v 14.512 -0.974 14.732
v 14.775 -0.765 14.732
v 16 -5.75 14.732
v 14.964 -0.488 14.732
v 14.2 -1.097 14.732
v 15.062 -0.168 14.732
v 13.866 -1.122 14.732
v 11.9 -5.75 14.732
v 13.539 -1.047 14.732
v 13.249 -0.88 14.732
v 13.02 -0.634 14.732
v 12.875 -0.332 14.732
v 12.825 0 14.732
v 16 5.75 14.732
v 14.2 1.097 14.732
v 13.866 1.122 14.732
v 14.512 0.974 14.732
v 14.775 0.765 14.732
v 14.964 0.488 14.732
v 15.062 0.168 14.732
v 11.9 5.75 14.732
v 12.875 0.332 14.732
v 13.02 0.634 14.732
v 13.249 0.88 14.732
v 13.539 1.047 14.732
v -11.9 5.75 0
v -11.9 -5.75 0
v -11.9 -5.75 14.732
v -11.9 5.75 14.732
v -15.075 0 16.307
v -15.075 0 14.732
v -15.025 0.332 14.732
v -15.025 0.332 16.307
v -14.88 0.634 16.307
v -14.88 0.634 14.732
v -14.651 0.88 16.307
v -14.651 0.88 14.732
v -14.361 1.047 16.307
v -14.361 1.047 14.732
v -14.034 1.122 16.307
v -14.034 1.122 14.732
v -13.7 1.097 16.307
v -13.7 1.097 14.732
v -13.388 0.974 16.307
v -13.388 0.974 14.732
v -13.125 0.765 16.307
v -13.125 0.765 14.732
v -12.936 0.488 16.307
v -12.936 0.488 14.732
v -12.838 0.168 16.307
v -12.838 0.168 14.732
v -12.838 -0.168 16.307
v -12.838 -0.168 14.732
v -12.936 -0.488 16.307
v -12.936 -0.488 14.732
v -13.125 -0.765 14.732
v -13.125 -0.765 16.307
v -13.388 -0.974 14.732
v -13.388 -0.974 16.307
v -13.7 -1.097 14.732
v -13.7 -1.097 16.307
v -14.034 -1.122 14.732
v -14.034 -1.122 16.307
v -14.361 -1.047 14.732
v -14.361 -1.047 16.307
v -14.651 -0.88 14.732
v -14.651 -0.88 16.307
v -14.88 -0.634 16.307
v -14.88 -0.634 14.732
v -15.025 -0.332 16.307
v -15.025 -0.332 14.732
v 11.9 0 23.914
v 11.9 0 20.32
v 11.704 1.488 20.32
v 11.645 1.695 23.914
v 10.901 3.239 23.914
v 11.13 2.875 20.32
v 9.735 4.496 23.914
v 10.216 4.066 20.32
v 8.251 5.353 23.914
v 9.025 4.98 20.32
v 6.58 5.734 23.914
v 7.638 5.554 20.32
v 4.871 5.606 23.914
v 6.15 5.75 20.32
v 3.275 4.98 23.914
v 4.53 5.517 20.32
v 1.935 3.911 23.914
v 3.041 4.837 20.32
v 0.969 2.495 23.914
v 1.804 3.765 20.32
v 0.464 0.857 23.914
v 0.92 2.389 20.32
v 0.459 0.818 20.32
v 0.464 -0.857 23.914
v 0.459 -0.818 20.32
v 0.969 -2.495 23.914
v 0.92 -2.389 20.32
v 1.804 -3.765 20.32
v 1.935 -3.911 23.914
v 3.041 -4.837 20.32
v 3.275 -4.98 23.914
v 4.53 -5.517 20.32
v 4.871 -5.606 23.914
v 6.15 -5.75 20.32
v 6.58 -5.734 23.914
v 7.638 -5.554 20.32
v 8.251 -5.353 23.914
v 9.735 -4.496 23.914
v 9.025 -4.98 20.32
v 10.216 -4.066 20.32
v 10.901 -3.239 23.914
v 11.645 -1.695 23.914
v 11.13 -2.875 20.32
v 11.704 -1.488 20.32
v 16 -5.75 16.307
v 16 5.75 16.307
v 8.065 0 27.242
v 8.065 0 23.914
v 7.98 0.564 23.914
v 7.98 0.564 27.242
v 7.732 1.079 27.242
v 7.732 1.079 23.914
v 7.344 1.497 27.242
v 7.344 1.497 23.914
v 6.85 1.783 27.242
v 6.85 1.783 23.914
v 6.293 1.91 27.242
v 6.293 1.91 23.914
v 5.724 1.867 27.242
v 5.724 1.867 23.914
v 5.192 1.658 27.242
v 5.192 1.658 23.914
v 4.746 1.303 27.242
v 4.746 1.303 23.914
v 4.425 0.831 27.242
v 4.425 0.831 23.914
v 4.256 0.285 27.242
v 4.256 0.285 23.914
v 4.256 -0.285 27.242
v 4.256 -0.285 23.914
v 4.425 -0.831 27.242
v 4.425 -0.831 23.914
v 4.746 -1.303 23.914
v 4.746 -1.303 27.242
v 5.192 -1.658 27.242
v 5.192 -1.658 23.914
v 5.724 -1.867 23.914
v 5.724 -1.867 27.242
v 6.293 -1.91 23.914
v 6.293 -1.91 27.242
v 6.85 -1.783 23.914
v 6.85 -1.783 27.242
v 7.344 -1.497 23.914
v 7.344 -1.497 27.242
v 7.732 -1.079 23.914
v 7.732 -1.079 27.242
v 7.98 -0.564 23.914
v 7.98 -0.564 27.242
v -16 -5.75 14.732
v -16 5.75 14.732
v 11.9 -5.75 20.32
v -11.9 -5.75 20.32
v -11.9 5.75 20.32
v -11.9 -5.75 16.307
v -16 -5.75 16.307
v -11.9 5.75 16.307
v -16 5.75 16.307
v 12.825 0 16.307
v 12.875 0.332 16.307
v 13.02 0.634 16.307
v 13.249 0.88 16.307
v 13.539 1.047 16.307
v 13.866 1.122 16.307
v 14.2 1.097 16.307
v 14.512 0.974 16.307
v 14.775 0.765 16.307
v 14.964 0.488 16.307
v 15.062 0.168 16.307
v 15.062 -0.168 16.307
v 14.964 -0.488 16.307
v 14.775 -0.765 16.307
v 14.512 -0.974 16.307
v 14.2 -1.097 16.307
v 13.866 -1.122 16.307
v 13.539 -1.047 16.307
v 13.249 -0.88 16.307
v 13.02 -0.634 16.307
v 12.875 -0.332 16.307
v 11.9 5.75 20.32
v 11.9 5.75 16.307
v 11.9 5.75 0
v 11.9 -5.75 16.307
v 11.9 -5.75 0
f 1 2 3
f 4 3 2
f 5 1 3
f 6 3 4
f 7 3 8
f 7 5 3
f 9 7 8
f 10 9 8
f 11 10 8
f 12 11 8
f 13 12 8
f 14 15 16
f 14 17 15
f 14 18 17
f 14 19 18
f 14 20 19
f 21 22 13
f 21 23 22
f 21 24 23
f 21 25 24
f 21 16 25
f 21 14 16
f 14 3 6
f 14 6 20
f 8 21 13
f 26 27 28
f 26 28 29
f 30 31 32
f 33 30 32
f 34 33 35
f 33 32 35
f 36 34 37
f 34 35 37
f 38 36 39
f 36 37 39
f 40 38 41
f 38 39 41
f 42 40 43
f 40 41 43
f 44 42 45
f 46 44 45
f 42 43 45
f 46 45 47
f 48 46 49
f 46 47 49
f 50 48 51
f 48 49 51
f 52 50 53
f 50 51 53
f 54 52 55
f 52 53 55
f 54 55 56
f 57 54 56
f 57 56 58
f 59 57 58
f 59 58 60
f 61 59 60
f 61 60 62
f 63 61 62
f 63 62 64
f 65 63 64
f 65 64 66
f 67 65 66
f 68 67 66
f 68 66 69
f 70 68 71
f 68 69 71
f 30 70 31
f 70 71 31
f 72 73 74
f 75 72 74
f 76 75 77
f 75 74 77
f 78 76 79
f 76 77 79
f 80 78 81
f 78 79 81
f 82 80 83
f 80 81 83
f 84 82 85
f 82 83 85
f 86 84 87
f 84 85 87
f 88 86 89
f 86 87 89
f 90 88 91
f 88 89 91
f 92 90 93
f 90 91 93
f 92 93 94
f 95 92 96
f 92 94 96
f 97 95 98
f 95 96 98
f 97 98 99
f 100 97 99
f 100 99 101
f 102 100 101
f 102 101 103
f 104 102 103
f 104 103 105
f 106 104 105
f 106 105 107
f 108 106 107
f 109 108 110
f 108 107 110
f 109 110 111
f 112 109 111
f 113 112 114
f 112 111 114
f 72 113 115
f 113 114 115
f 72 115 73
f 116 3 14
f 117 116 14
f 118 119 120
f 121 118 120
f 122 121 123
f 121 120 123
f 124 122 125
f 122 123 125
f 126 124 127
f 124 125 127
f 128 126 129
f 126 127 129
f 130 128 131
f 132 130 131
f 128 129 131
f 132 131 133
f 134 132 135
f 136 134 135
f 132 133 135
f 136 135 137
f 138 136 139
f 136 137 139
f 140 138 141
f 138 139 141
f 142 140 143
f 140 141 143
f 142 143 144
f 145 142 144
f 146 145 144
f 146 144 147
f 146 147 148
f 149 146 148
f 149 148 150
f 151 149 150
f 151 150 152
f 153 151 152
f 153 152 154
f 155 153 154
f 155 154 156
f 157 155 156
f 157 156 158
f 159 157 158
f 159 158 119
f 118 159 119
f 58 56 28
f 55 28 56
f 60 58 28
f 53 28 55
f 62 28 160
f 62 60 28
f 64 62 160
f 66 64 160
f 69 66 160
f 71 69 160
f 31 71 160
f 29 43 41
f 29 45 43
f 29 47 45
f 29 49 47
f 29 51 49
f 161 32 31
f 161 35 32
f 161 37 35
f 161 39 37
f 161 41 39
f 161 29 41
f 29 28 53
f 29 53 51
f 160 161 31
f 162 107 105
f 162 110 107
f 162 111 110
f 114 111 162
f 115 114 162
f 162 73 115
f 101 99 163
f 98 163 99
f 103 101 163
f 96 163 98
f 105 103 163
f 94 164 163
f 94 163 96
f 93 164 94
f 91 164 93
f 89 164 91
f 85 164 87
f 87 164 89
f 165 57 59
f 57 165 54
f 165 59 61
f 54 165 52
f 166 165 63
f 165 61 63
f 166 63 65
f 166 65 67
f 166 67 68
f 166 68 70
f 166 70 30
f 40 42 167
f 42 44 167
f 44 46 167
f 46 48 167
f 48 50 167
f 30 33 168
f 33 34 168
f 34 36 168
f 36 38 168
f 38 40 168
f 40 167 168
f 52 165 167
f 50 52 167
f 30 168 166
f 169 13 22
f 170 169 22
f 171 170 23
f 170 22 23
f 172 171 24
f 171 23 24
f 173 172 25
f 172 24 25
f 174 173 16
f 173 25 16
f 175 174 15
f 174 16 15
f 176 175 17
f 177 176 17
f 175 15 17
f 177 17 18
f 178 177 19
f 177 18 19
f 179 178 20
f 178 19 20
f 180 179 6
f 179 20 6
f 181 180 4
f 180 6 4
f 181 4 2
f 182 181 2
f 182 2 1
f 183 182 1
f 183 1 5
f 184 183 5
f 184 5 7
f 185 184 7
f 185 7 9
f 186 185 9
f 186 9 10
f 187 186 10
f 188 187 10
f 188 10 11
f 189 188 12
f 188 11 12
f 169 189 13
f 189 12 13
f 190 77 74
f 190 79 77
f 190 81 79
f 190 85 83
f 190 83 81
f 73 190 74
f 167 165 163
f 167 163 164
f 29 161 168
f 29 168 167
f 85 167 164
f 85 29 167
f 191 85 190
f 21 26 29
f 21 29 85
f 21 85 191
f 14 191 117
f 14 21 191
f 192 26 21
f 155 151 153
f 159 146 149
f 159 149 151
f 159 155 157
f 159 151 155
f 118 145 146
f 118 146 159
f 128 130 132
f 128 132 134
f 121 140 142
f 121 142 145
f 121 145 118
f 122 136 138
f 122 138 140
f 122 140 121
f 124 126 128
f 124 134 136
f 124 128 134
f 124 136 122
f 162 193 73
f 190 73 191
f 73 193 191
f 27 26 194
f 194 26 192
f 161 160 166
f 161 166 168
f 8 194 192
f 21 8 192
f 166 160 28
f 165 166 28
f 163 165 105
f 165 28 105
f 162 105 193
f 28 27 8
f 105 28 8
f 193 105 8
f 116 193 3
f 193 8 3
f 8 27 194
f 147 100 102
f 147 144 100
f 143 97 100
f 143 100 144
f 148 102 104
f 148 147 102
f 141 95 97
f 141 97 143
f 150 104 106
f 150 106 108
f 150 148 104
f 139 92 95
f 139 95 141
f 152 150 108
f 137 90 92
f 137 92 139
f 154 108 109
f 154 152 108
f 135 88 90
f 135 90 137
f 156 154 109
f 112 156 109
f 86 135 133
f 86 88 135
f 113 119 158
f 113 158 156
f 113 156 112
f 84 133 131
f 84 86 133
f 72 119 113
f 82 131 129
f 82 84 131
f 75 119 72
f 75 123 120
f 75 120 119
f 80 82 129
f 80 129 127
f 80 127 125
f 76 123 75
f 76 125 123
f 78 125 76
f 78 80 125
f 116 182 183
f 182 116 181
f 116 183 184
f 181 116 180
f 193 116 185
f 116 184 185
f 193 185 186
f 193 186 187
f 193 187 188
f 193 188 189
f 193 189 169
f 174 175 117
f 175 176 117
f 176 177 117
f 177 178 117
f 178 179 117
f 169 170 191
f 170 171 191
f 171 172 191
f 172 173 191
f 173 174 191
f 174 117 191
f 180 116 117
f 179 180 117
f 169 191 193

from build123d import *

# Parameters (mm, degrees)
SKETCH1_W           = 23.8
SKETCH1_H           = 11.5
BODY_DEPTH          = 20.32
SKETCH2_W           = 4.1
SKETCH2_H           = 11.5
SKETCH2_R           = 1.125
BOSS_EXTRUDE2_DEPTH = 1.5748
SKETCH3_R           = 1.915
BOSS_EXTRUDE3_DEPTH = 6.9215
SKETCH4_R           = 5.75
BOSS_EXTRUDE4_DEPTH = 3.5941


with BuildPart() as part:
    # Sketch1 → Body (new body)
    with BuildSketch(Plane.XY):
        Rectangle(SKETCH1_W, SKETCH1_H)
    extrude(amount=BODY_DEPTH)

    # Sketch2 → Boss-Extrude2 (add)
    with BuildSketch(Plane(origin=(0, 0, 14.732), x_dir=(-1, 0, 0), z_dir=(0, 0, -1))):
        with Locations((13.95, 0)):
            Rectangle(SKETCH2_W, SKETCH2_H)
        with Locations((13.95, 0)):
            Circle(SKETCH2_R, mode=Mode.SUBTRACT)
        with Locations((-13.95, 0)):
            Rectangle(SKETCH2_W, SKETCH2_H)
        with Locations((-13.95, 0)):
            Circle(SKETCH2_R, mode=Mode.SUBTRACT)
    extrude(amount=-BOSS_EXTRUDE2_DEPTH)

    # Sketch3 → Boss-Extrude3 (add)
    with BuildSketch(Plane.XY.offset(20.32)):
        with Locations((6.15, 0)):
            Circle(SKETCH3_R)
    extrude(amount=BOSS_EXTRUDE3_DEPTH)

    # Sketch4 → Boss-Extrude4 (add)
    with BuildSketch(Plane.XY.offset(20.32)):
        with Locations((6.15, 0)):
            Circle(SKETCH4_R)
    extrude(amount=BOSS_EXTRUDE4_DEPTH)


solid = part.part
